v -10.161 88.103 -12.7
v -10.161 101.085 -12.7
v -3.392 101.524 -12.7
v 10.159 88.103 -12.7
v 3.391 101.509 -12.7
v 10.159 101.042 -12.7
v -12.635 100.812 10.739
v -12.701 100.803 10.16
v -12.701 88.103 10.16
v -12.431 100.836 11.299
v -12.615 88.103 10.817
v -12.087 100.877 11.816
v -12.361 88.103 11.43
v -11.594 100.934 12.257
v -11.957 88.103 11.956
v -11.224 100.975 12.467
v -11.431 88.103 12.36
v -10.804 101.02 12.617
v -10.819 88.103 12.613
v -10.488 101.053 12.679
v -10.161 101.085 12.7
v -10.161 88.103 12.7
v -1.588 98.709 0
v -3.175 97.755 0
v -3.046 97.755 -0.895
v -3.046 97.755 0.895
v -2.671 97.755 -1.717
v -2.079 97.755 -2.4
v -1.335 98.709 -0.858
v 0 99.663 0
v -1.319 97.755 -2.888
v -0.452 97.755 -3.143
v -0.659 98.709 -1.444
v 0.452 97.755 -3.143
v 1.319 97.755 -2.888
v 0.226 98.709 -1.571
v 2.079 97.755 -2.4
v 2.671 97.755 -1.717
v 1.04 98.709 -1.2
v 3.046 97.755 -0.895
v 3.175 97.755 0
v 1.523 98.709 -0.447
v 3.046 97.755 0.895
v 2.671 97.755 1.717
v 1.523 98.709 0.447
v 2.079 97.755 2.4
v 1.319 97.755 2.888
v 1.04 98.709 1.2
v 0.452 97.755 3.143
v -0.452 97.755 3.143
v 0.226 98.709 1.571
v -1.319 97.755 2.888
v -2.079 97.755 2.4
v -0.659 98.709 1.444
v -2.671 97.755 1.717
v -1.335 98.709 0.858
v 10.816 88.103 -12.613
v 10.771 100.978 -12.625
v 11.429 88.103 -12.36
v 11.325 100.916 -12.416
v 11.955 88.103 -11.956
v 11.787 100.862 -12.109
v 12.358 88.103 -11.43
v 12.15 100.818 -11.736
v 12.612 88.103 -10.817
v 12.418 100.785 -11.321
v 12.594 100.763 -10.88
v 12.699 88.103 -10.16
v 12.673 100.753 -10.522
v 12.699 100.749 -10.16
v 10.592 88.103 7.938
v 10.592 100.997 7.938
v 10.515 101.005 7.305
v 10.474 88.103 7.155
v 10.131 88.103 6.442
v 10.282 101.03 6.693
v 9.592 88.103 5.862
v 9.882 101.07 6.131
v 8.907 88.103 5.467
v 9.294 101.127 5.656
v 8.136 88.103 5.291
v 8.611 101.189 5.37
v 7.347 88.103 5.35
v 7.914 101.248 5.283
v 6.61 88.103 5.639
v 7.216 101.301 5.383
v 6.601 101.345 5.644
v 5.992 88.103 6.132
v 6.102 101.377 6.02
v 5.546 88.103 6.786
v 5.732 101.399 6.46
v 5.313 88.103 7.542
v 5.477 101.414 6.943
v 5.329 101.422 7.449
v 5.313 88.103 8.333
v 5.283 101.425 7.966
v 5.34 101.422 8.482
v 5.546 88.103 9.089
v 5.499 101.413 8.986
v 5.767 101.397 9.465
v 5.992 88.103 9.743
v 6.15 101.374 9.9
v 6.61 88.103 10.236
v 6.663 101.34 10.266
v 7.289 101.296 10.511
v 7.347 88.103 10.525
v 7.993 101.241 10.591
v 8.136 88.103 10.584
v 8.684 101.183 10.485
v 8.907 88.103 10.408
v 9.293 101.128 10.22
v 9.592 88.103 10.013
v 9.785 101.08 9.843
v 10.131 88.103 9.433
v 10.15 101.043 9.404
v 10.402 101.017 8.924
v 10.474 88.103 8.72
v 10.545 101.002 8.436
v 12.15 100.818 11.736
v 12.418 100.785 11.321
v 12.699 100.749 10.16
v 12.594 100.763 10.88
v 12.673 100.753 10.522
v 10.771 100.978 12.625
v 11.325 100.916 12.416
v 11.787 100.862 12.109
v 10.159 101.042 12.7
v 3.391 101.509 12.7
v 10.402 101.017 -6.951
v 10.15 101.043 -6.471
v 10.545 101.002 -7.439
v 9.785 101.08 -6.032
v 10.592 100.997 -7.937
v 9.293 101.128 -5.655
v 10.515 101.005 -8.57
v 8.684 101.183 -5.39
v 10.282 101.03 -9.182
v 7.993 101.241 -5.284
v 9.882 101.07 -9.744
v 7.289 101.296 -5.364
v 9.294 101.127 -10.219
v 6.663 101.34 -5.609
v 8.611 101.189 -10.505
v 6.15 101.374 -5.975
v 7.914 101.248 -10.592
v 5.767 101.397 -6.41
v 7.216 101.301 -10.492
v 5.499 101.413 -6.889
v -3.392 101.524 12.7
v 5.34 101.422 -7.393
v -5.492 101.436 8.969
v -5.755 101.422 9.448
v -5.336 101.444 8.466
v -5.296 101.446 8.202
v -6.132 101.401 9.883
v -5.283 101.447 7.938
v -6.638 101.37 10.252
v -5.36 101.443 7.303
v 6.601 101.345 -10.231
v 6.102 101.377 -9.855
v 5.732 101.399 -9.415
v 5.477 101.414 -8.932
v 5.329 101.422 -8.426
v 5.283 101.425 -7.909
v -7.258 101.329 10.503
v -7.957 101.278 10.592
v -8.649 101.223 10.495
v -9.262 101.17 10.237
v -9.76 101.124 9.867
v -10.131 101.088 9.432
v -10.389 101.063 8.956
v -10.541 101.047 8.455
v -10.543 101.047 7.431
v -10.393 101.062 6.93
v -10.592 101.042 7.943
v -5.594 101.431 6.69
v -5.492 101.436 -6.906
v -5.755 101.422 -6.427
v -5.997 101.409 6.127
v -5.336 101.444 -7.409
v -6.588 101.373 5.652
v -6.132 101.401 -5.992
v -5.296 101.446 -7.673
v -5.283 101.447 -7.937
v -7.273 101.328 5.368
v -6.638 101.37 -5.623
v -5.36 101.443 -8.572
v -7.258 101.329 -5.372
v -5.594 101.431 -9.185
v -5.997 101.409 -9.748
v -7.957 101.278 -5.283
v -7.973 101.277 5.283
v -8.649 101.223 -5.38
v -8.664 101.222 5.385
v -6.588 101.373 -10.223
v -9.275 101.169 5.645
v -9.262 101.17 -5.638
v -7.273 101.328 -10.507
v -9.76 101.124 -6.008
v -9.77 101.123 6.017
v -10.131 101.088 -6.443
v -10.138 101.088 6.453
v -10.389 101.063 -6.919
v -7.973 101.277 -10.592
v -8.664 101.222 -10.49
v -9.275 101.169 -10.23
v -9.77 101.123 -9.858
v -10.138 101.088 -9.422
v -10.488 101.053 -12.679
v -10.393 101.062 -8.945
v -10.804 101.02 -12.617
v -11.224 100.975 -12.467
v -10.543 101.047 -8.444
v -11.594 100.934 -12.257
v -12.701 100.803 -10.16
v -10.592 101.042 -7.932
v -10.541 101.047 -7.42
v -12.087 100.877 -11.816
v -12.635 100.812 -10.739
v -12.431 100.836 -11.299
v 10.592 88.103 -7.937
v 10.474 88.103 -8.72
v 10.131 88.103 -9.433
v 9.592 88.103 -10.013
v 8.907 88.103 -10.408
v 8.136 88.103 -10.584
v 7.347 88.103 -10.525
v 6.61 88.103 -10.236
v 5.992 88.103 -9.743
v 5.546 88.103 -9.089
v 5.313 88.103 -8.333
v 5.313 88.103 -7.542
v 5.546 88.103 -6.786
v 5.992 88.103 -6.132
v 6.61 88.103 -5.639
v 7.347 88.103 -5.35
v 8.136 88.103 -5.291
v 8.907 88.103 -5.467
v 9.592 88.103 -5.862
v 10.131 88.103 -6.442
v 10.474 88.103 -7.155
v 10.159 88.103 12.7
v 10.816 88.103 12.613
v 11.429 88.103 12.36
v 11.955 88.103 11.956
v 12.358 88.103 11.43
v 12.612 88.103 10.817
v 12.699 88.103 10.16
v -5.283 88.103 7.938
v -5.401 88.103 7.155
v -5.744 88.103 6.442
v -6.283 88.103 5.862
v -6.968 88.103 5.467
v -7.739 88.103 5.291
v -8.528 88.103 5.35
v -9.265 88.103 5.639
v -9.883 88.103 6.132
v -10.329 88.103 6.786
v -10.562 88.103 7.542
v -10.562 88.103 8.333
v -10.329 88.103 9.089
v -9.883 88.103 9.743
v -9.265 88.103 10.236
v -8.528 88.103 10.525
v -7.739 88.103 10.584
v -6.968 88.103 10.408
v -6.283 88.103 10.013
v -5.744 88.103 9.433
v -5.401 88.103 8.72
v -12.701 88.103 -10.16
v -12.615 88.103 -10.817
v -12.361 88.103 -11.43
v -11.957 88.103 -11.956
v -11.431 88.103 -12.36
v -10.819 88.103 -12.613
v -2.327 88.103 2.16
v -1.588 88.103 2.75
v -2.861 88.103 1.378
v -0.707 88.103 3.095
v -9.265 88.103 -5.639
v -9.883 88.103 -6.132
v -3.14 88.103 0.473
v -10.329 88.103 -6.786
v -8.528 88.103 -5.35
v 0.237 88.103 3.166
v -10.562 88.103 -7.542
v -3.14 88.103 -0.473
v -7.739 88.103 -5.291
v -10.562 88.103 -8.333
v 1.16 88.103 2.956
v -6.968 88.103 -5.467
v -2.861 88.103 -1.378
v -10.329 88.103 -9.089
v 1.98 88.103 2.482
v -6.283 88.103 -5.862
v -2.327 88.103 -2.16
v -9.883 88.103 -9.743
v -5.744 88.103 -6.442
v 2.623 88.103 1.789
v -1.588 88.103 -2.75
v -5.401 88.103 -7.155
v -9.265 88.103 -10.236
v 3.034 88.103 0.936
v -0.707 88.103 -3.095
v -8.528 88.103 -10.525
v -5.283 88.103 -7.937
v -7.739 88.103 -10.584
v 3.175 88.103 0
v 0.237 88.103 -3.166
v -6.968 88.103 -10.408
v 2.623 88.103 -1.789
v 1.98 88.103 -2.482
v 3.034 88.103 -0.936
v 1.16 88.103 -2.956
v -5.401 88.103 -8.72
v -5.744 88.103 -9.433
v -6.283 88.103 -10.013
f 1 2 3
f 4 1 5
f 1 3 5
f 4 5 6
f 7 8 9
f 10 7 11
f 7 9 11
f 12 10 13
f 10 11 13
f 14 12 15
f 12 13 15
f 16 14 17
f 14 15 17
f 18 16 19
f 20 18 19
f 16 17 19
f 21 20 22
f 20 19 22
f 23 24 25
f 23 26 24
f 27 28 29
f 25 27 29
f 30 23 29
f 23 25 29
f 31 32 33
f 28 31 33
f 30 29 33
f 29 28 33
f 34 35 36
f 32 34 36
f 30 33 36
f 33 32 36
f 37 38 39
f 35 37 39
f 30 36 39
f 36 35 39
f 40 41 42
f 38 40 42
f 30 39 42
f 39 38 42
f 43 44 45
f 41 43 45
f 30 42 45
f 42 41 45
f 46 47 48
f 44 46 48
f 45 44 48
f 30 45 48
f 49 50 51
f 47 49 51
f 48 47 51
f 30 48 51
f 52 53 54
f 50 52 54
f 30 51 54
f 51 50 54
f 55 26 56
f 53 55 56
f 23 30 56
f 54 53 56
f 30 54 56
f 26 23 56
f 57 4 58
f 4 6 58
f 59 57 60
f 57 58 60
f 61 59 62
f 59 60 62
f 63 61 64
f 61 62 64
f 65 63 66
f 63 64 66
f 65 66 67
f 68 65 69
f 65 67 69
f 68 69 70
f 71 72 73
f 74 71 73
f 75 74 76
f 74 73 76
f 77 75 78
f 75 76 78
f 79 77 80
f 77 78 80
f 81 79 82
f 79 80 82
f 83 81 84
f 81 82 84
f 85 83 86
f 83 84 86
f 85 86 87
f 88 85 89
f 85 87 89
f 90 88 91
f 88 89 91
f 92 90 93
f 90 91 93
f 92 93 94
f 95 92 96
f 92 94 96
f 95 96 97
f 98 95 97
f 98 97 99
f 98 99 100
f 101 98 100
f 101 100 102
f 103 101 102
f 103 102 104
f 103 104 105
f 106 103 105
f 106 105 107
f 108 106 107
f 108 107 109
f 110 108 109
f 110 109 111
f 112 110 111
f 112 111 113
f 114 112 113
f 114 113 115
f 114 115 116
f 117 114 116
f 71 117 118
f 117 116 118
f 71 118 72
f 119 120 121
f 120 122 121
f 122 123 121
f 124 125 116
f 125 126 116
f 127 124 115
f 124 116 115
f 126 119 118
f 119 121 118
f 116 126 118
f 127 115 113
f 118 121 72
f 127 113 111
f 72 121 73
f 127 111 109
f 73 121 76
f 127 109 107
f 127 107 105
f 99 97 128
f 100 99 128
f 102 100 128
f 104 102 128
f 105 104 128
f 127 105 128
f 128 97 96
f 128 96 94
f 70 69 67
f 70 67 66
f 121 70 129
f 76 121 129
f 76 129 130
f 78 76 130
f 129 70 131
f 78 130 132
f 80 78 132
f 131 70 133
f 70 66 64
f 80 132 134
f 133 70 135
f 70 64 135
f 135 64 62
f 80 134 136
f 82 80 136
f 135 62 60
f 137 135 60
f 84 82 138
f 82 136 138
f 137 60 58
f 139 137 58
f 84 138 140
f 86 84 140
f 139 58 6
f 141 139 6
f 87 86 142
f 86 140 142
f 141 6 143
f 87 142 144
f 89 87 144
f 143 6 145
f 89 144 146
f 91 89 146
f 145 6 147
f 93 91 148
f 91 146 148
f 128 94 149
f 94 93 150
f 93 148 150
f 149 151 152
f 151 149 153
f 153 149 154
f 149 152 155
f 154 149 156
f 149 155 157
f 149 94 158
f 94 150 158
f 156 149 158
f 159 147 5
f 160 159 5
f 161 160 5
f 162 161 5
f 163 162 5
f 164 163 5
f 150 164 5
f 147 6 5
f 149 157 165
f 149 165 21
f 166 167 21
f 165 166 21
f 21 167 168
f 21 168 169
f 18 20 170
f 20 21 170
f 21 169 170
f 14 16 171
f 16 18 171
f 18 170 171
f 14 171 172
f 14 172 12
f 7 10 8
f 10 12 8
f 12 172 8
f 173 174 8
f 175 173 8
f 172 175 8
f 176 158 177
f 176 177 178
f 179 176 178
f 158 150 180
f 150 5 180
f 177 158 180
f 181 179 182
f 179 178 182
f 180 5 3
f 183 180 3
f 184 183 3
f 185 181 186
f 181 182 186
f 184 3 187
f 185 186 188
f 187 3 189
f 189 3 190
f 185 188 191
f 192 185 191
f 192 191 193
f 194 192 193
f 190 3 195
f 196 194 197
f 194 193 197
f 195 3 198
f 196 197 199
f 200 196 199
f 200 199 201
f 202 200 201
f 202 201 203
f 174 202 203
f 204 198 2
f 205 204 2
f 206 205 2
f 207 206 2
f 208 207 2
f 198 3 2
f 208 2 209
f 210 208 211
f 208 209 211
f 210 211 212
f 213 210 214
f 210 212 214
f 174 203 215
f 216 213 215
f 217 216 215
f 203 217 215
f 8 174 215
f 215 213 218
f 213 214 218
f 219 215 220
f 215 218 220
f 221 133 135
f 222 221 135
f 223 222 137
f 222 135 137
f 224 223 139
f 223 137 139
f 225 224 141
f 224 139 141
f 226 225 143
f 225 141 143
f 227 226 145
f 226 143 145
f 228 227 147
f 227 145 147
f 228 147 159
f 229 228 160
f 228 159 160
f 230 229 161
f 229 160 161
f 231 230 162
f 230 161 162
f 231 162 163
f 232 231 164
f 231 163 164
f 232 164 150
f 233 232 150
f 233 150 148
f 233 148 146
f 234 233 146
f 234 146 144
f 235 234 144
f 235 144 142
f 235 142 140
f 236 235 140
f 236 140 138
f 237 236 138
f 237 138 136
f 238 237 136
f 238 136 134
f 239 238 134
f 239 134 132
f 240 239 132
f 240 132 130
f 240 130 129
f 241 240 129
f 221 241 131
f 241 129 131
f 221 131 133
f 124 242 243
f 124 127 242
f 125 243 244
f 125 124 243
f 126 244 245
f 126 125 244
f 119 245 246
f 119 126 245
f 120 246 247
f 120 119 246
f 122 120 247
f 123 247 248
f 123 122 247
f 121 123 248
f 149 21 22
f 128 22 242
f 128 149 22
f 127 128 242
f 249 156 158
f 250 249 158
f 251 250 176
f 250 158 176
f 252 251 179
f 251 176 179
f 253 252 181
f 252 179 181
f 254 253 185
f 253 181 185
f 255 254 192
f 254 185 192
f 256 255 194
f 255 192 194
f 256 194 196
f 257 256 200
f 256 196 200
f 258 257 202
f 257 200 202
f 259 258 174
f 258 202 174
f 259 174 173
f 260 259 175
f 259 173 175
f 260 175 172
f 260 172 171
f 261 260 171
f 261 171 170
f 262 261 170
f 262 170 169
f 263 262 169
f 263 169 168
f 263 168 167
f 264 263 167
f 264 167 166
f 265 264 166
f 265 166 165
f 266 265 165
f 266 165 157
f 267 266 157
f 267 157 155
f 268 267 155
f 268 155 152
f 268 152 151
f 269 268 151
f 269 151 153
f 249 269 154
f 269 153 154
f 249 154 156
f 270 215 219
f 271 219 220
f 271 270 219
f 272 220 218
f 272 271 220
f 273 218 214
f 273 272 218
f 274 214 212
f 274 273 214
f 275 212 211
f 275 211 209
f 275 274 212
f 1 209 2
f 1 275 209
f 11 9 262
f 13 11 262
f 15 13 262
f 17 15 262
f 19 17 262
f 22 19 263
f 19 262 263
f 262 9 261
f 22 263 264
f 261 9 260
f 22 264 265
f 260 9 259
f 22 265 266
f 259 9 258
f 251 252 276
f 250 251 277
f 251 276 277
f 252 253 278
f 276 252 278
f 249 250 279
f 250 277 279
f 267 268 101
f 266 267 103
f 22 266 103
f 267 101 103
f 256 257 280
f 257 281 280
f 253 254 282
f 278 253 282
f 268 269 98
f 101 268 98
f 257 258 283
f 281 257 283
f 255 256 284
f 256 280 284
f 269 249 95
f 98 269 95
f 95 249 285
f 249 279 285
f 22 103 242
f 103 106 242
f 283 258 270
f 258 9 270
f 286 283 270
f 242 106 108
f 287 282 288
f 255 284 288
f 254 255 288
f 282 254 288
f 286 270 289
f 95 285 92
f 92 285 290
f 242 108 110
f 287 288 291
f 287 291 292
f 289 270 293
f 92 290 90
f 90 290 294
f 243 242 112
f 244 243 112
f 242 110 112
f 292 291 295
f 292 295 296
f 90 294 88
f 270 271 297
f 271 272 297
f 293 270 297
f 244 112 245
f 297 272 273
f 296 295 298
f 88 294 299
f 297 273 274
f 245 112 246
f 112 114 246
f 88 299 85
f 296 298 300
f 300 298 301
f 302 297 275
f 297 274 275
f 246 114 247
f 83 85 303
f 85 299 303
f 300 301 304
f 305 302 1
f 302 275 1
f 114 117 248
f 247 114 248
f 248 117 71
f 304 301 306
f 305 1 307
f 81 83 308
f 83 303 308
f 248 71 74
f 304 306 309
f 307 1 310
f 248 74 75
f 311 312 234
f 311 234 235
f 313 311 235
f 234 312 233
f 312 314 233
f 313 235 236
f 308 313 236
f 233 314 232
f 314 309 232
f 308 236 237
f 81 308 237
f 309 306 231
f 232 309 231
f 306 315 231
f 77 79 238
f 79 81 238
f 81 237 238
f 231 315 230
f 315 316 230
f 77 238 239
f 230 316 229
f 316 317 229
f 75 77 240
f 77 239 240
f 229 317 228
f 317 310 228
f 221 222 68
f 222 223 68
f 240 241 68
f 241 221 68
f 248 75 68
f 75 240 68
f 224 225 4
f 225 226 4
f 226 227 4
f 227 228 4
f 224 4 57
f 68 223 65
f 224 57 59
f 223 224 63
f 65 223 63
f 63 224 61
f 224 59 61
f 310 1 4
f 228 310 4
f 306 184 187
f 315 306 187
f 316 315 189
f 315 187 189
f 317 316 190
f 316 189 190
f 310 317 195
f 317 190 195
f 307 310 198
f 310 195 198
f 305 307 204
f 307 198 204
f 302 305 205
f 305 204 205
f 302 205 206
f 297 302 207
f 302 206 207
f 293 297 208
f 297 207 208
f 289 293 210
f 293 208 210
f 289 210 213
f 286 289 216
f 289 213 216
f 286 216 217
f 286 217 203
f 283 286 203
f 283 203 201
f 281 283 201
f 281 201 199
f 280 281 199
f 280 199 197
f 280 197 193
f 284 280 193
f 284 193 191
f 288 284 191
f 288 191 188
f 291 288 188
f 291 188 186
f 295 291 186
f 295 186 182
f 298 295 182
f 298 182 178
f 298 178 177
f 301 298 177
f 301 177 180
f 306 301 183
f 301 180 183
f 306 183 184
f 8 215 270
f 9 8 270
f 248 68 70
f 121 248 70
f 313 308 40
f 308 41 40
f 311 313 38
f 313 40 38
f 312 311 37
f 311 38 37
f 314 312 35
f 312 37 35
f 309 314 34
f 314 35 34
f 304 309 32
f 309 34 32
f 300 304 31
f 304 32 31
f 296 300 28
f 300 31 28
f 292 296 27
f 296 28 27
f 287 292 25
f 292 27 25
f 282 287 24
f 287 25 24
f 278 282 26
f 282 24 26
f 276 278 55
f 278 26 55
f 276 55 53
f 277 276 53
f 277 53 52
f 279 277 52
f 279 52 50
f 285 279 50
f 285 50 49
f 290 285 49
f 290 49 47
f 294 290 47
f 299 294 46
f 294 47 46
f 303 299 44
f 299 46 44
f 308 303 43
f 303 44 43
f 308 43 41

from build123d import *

# Parameters (mm, degrees)
BOSS_EXTRUDE1_DEPTH             = 12.7
BOSS_EXTRUDE1_DEPTH_BACK        = 12.7
F_1_4_0_25_DIAMETER_SLOT1_D     = 6.35
F_1_4_0_25_DIAMETER_SLOT1_DEPTH = 9.652
F_1_4_0_25_DIAMETER_SLOT1_TIP   = 1.907732465
F_4_0_209_DIAMETER_SLOT1_D      = 5.3086
F_4_0_209_DIAMETER_SLOT1_DEPTH  = 13.462
F_4_0_209_DIAMETER_SLOT1_TIP    = 1.594864341
FILLET1_R                       = 2.54


with BuildPart() as part:
    # Sketch1 → Boss-Extrude1 (new, two sides: drawn at the far end of the back side and taken through both)
    with BuildSketch(Plane.XY.offset(-BOSS_EXTRUDE1_DEPTH_BACK)):
        with BuildLine():
            Line((-12.701329683, 100.803292467), (-12.701329683, 88.103292467))
            Line((-12.701329683, 88.103292467), (12.698670317, 88.103292467))
            Line((12.698670317, 88.103292467), (12.698670317, 100.749441262))
            ThreePointArc((12.698670317, 100.749441262), (0.000359797, 101.573243718), (-12.701329683, 100.803292467))
        make_face()
    extrude(amount=BOSS_EXTRUDE1_DEPTH + BOSS_EXTRUDE1_DEPTH_BACK)

    # 1/4 (0.25) Diameter Slot1
    with Locations(Plane(origin=(0, 88.103292467, 0), x_dir=(-1, 0, 0), z_dir=(0, -1, 0))):
        with Locations((0, 0)):
            Hole(F_1_4_0_25_DIAMETER_SLOT1_D / 2, depth=F_1_4_0_25_DIAMETER_SLOT1_DEPTH)
            with Locations((0, 0, -(F_1_4_0_25_DIAMETER_SLOT1_DEPTH + F_1_4_0_25_DIAMETER_SLOT1_TIP / 2))):  # 118° drill point
                Cone(0, F_1_4_0_25_DIAMETER_SLOT1_D / 2, F_1_4_0_25_DIAMETER_SLOT1_TIP, mode=Mode.SUBTRACT)

    # #4 (0.209) Diameter Slot1
    with Locations(Plane(origin=(0, 88.103292467, 0), x_dir=(-1, 0, 0), z_dir=(0, -1, 0))):
        with Locations((-7.9375, -7.9375), (-7.9375, 7.9375), (7.9375, 7.9375), (7.9375, -7.9375)):
            Hole(F_4_0_209_DIAMETER_SLOT1_D / 2, depth=F_4_0_209_DIAMETER_SLOT1_DEPTH)
            with Locations((0, 0, -(F_4_0_209_DIAMETER_SLOT1_DEPTH + F_4_0_209_DIAMETER_SLOT1_TIP / 2))):  # 118° drill point
                Cone(0, F_4_0_209_DIAMETER_SLOT1_D / 2, F_4_0_209_DIAMETER_SLOT1_TIP, mode=Mode.SUBTRACT)

    # Fillet1
    fillet1_edges = [part.edges().sort_by_distance(p)[0] for p in [
        (-12.701329683, 94.453292467, 12.7),
        (12.698670317, 94.426366864, -12.7),
        (12.698670317, 94.426366864, 12.7),
        (-12.701329683, 94.453292467, -12.7),
    ]]
    fillet(fillet1_edges, radius=FILLET1_R)


solid = part.part
